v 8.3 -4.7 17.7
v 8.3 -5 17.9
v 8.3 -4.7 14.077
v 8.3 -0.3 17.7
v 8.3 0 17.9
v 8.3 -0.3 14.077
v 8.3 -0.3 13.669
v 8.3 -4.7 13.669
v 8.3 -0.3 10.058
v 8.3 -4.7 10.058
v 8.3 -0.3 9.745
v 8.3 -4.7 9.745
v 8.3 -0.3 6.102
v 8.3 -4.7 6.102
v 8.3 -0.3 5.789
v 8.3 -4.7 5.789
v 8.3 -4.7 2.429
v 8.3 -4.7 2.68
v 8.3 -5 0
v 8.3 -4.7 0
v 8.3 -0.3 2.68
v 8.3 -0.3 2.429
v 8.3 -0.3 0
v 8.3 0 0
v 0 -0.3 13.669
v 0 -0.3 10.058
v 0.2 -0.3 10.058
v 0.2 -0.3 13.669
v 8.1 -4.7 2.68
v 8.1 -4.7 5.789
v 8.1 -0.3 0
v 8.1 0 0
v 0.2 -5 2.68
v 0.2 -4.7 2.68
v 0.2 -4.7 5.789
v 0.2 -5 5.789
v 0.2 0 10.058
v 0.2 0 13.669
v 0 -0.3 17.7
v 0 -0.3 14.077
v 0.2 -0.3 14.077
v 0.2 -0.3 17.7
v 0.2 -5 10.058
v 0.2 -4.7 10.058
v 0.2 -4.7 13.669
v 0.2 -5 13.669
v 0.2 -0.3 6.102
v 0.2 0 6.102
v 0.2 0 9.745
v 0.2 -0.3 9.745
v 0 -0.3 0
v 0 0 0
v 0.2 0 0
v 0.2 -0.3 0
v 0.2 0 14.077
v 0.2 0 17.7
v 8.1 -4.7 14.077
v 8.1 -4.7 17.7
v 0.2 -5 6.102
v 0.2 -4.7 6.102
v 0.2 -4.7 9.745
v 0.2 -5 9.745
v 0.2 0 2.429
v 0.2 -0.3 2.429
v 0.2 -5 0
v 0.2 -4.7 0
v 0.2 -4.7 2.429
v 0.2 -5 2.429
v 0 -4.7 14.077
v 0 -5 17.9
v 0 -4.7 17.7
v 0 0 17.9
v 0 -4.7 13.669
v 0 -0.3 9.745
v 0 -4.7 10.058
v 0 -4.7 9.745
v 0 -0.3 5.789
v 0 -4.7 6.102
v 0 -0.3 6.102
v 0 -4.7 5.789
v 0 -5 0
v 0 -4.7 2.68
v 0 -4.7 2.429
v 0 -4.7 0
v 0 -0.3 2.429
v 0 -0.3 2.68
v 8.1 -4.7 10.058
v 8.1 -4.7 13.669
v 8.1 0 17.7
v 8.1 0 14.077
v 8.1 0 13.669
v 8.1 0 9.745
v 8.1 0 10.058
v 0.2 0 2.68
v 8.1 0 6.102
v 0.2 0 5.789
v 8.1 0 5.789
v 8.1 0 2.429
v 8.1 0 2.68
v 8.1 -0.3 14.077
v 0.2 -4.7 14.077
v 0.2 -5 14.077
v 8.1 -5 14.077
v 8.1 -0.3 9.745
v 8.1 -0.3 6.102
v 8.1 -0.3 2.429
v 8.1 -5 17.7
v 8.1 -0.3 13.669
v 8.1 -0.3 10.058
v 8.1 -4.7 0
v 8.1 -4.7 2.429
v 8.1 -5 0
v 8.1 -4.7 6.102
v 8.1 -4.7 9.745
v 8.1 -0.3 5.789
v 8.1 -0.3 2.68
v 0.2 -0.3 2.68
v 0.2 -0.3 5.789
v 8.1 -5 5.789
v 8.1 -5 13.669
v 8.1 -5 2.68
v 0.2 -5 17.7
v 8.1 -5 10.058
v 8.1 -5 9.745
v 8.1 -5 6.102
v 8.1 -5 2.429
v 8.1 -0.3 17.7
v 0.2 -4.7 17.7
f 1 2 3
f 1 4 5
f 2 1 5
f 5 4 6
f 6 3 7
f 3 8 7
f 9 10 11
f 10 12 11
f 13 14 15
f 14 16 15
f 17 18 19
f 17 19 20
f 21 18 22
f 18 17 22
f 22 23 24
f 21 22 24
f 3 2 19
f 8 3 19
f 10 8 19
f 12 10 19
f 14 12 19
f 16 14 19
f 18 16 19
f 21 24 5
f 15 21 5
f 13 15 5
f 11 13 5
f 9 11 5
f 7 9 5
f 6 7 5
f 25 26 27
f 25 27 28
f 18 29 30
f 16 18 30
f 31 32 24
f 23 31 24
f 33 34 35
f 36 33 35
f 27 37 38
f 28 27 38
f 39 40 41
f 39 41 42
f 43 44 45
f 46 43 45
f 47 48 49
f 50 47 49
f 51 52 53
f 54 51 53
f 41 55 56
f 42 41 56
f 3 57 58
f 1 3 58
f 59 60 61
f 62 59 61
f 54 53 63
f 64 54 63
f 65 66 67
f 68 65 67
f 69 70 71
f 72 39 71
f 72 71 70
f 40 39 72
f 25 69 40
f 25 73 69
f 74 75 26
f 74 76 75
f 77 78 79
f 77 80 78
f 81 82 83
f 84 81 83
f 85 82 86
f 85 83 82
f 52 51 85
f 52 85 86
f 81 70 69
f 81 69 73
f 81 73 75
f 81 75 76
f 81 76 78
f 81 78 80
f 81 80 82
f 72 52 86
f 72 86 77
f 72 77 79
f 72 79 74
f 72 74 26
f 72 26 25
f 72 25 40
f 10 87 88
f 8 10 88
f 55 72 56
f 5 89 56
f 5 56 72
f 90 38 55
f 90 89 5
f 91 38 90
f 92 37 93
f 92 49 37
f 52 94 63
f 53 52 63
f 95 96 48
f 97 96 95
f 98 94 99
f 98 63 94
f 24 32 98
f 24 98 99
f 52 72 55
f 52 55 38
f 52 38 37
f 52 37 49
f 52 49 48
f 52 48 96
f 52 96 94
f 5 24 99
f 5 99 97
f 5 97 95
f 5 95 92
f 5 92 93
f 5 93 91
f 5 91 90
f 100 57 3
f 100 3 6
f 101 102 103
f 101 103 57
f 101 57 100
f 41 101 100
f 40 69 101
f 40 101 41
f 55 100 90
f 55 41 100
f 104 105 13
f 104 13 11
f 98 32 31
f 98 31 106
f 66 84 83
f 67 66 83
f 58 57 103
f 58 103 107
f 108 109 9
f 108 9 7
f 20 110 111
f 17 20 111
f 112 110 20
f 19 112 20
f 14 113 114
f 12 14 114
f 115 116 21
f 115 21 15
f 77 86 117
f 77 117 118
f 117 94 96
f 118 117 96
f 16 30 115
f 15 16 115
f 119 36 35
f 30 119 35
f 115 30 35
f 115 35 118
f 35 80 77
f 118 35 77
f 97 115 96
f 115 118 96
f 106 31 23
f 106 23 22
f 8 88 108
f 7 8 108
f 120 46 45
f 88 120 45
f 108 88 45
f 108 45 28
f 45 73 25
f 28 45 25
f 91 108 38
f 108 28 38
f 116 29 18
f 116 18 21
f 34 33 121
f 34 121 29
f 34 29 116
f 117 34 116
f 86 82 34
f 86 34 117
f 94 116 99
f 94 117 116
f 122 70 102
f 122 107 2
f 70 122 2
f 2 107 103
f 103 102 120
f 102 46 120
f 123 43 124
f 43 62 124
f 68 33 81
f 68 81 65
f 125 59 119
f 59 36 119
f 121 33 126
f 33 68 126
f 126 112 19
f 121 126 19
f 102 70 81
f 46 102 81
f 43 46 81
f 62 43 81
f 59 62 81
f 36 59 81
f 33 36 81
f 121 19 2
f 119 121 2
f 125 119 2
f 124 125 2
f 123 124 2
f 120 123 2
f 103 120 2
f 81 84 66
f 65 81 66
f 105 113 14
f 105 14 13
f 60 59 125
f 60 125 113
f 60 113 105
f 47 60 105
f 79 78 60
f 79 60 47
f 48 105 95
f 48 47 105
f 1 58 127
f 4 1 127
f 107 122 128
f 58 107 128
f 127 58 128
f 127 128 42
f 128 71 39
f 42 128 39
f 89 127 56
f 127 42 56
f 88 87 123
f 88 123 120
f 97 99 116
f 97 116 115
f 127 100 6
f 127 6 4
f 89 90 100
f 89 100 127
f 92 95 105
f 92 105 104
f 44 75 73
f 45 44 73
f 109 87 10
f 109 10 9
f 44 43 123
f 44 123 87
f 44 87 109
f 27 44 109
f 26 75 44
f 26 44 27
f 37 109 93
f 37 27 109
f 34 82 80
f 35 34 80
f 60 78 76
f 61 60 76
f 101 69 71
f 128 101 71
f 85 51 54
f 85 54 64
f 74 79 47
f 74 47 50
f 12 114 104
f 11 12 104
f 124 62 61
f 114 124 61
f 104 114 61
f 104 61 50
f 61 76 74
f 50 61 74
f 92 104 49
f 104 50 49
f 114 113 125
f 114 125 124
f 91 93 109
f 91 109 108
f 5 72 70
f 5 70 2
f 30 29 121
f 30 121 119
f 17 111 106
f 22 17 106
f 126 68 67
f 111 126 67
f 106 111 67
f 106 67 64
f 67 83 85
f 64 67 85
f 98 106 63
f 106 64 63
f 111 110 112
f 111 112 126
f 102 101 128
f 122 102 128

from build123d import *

# Parameters (mm, degrees)
F0_W     = 8.3
F0_H     = 5
F1_DEPTH = 17.9
F2_W     = 7.9
F2_H     = 3.622741
F2_H_2   = 3.610624
F2_H_3   = 3.642021
F2_H_4   = 3.108276
F2_H_5   = 2.429072
F3_DEPTH = 25
F4_W     = 4.4
F4_H     = 3.622741
F4_H_2   = 3.610624
F4_H_3   = 3.642021
F4_H_4   = 3.108276
F4_H_5   = 2.429072
F5_DEPTH = 25


with BuildPart() as f1:
    # F0 (on Top) → F1 (new body)
    with BuildSketch(Plane.XY):
        with Locations((4.15, -2.5)):
            Rectangle(F0_W, F0_H)
    extrude(amount=F1_DEPTH)

    # F2 (on face) → F3 (cut)
    with BuildSketch(Plane(origin=(0, 0, 0), x_dir=(-1, 0, 0), z_dir=(0, 1, 0))):
        with Locations((-4.15, 15.88863)):
            Rectangle(F2_W, F2_H)
        with Locations((-4.15, 11.86379)):
            Rectangle(F2_W, F2_H_2)
        with Locations((-4.15, 7.9235)):
            Rectangle(F2_W, F2_H_3)
        with Locations((-4.15, 4.234384)):
            Rectangle(F2_W, F2_H_4)
        with Locations((-4.15, 1.214536)):
            Rectangle(F2_W, F2_H_5)
    extrude(amount=-F3_DEPTH, mode=Mode.SUBTRACT)

    # F4 (on Right) → F5 (cut)
    with BuildSketch(Plane.YZ):
        with Locations((-2.5, 15.88863)):
            Rectangle(F4_W, F4_H)
        with Locations((-2.5, 11.86379)):
            Rectangle(F4_W, F4_H_2)
        with Locations((-2.5, 7.9235)):
            Rectangle(F4_W, F4_H_3)
        with Locations((-2.5, 4.234384)):
            Rectangle(F4_W, F4_H_4)
        with Locations((-2.5, 1.214536)):
            Rectangle(F4_W, F4_H_5)
    extrude(amount=F5_DEPTH, mode=Mode.SUBTRACT)


solid = f1.part
